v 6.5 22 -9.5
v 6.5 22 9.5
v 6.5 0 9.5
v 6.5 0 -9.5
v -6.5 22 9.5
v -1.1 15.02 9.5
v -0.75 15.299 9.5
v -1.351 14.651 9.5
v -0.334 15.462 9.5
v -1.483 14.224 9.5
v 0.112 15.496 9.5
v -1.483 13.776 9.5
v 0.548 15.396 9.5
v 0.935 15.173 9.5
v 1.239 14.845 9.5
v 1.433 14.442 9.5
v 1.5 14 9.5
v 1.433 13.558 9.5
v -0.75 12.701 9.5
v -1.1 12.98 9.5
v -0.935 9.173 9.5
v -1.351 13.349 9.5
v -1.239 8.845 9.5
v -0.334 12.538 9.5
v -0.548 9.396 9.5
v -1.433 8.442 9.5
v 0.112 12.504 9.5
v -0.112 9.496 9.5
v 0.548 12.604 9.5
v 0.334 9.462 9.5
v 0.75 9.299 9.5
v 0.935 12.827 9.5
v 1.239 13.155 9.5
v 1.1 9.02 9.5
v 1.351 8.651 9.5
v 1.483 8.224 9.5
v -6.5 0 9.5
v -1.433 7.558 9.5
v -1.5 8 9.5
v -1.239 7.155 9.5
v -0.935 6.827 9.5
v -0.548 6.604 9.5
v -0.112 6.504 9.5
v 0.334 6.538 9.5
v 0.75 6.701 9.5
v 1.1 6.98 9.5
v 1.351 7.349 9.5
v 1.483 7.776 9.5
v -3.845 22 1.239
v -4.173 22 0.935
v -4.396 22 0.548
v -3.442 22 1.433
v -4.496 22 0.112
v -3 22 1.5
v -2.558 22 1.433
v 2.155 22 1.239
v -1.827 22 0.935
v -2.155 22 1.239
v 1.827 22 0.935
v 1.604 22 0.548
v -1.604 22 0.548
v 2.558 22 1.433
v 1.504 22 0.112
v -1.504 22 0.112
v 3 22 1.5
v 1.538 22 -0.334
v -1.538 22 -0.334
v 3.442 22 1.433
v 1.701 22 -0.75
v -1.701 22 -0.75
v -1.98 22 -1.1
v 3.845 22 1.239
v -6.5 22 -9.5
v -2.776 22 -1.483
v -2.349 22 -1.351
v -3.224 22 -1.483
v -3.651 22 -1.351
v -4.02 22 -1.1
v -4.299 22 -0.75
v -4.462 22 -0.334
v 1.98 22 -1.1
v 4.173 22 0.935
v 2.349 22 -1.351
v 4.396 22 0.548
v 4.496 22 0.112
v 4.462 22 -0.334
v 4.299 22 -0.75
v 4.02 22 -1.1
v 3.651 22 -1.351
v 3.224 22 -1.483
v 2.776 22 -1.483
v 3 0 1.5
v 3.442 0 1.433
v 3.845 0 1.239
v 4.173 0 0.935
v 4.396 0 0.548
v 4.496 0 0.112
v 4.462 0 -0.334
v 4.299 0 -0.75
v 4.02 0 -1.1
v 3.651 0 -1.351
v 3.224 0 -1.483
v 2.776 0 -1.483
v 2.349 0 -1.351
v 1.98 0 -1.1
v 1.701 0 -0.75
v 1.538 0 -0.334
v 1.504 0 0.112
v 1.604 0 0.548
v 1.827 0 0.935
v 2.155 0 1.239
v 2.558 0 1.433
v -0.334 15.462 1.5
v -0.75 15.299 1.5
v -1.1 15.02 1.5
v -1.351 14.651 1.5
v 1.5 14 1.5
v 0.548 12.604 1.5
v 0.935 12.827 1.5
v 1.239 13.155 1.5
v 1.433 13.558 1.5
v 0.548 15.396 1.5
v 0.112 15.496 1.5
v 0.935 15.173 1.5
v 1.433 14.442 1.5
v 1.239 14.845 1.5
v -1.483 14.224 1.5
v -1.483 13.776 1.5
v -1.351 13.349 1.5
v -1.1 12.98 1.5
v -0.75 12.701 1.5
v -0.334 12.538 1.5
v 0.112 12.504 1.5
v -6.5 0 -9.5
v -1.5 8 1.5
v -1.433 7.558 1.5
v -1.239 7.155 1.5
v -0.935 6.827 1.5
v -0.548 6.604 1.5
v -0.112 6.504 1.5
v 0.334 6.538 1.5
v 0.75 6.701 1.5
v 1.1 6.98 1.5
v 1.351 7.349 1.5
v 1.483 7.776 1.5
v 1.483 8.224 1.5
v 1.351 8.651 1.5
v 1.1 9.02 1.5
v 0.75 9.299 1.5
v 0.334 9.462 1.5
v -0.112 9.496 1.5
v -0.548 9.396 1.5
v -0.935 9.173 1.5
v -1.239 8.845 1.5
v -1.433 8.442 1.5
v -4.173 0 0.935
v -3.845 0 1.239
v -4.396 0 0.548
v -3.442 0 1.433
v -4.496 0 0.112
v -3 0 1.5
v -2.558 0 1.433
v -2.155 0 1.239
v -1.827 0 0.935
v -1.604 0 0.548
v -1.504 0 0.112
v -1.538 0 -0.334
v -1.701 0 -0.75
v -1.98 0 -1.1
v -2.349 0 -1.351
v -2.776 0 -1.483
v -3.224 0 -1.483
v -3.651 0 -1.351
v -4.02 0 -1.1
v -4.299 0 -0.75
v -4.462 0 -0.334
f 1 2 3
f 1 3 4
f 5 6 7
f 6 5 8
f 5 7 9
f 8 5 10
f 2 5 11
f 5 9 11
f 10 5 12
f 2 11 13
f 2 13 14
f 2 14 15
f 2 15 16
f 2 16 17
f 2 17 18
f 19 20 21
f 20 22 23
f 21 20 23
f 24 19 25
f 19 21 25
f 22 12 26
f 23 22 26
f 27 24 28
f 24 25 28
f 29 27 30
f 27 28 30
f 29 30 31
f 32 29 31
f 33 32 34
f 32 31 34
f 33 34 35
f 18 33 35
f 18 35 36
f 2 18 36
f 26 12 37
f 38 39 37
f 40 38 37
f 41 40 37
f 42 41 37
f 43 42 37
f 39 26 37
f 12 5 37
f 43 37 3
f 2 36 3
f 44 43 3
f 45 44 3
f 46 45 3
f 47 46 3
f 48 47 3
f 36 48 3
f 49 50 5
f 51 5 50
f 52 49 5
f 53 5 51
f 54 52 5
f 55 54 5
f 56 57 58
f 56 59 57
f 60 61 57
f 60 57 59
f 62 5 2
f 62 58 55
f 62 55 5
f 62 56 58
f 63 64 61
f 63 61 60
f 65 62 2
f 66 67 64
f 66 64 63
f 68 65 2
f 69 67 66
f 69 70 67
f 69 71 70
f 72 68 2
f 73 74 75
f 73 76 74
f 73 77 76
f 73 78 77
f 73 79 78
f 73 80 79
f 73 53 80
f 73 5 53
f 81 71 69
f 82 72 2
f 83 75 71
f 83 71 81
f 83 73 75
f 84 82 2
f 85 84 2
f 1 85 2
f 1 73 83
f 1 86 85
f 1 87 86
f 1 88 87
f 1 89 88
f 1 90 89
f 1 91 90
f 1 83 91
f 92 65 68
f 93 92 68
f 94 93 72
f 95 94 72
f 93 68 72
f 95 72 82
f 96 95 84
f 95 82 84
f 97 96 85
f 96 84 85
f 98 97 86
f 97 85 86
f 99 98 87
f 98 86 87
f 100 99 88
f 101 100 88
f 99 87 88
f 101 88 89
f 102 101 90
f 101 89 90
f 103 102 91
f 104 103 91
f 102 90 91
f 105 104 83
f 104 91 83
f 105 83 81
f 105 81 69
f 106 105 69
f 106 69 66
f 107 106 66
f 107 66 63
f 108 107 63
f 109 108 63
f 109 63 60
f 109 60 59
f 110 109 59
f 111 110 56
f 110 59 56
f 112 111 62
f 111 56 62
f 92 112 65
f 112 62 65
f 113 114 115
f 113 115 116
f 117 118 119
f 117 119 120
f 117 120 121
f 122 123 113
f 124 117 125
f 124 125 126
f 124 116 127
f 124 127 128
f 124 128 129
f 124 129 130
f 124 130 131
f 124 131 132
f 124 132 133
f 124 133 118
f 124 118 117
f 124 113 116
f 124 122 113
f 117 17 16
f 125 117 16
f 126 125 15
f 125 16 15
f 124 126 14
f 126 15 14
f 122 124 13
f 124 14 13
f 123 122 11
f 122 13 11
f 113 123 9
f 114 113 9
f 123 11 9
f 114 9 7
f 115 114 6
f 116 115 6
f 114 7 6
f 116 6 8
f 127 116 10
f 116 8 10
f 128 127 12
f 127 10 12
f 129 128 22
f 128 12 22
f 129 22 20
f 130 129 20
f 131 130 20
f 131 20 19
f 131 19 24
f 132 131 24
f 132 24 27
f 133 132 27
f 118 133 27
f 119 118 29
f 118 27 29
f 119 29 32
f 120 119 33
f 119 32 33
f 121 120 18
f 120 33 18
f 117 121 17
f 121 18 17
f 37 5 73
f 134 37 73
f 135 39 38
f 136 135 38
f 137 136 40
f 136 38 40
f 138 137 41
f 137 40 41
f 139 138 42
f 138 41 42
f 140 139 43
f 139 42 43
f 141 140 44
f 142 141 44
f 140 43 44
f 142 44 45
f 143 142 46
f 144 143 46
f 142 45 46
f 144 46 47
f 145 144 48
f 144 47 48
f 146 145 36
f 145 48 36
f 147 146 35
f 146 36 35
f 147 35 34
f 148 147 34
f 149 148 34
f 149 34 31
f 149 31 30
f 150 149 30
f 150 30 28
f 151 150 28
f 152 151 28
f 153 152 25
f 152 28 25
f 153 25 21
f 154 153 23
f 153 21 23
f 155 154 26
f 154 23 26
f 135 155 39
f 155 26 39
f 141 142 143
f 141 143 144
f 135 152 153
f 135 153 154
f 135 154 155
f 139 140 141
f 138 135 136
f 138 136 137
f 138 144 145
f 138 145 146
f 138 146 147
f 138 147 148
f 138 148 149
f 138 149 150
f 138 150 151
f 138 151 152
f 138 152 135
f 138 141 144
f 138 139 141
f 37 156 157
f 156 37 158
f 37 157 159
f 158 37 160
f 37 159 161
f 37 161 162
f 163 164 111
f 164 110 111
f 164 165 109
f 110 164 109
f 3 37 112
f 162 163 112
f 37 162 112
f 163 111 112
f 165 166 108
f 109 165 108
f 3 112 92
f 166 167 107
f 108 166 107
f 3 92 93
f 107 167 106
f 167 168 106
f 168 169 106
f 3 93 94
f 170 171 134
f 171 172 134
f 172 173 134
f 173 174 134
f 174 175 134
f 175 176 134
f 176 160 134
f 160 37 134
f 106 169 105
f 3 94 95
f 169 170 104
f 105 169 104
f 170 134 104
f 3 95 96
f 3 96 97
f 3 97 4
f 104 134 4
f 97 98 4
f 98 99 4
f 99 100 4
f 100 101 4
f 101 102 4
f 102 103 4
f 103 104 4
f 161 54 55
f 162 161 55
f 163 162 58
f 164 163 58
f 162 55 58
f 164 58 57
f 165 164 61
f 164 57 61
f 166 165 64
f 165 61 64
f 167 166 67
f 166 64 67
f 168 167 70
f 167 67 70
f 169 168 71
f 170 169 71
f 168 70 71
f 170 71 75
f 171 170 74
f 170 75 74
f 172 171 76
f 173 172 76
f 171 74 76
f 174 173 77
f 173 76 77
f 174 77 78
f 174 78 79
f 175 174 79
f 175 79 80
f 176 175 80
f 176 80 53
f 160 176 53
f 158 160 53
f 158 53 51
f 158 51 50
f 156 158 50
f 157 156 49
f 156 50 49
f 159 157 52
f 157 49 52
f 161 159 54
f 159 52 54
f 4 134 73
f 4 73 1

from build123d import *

# Parameters (mm, degrees)
SKETCH1_W           = 13
SKETCH1_H           = 19
BOSS_EXTRUDE1_DEPTH = 22
SKETCH3_R           = 1.5
CUT_EXTRUDE1_DEPTH  = 8
SKETCH4_R           = 1.5
CUT_EXTRUDE2_DEPTH  = 22


with BuildPart() as part:
    # Sketch1 → Boss-Extrude1 (new body)
    with BuildSketch(Plane(origin=(0, 0, 0), x_dir=(1, 0, 0), z_dir=(0, 1, 0))):
        Rectangle(SKETCH1_W, SKETCH1_H)
    extrude(amount=BOSS_EXTRUDE1_DEPTH)

    # Sketch3 → Cut-Extrude1 (cut)
    with BuildSketch(Plane.XY.offset(9.5)):
        with Locations((0, 14)):
            Circle(SKETCH3_R)
        with Locations(Location((0, 8, 0), (0, 0, 180))):
            Circle(SKETCH3_R)
    extrude(amount=-CUT_EXTRUDE1_DEPTH, mode=Mode.SUBTRACT)

    # Sketch4 → Cut-Extrude2 (cut)
    with BuildSketch(Plane(origin=(0, 22, 0), x_dir=(1, 0, 0), z_dir=(0, 1, 0))):
        with Locations(Location((3, 0, 0), (0, 0, 270))):
            Circle(SKETCH4_R)
        with Locations(Location((-3, 0, 0), (0, 0, 270))):
            Circle(SKETCH4_R)
    extrude(amount=-CUT_EXTRUDE2_DEPTH, mode=Mode.SUBTRACT)


solid = part.part
